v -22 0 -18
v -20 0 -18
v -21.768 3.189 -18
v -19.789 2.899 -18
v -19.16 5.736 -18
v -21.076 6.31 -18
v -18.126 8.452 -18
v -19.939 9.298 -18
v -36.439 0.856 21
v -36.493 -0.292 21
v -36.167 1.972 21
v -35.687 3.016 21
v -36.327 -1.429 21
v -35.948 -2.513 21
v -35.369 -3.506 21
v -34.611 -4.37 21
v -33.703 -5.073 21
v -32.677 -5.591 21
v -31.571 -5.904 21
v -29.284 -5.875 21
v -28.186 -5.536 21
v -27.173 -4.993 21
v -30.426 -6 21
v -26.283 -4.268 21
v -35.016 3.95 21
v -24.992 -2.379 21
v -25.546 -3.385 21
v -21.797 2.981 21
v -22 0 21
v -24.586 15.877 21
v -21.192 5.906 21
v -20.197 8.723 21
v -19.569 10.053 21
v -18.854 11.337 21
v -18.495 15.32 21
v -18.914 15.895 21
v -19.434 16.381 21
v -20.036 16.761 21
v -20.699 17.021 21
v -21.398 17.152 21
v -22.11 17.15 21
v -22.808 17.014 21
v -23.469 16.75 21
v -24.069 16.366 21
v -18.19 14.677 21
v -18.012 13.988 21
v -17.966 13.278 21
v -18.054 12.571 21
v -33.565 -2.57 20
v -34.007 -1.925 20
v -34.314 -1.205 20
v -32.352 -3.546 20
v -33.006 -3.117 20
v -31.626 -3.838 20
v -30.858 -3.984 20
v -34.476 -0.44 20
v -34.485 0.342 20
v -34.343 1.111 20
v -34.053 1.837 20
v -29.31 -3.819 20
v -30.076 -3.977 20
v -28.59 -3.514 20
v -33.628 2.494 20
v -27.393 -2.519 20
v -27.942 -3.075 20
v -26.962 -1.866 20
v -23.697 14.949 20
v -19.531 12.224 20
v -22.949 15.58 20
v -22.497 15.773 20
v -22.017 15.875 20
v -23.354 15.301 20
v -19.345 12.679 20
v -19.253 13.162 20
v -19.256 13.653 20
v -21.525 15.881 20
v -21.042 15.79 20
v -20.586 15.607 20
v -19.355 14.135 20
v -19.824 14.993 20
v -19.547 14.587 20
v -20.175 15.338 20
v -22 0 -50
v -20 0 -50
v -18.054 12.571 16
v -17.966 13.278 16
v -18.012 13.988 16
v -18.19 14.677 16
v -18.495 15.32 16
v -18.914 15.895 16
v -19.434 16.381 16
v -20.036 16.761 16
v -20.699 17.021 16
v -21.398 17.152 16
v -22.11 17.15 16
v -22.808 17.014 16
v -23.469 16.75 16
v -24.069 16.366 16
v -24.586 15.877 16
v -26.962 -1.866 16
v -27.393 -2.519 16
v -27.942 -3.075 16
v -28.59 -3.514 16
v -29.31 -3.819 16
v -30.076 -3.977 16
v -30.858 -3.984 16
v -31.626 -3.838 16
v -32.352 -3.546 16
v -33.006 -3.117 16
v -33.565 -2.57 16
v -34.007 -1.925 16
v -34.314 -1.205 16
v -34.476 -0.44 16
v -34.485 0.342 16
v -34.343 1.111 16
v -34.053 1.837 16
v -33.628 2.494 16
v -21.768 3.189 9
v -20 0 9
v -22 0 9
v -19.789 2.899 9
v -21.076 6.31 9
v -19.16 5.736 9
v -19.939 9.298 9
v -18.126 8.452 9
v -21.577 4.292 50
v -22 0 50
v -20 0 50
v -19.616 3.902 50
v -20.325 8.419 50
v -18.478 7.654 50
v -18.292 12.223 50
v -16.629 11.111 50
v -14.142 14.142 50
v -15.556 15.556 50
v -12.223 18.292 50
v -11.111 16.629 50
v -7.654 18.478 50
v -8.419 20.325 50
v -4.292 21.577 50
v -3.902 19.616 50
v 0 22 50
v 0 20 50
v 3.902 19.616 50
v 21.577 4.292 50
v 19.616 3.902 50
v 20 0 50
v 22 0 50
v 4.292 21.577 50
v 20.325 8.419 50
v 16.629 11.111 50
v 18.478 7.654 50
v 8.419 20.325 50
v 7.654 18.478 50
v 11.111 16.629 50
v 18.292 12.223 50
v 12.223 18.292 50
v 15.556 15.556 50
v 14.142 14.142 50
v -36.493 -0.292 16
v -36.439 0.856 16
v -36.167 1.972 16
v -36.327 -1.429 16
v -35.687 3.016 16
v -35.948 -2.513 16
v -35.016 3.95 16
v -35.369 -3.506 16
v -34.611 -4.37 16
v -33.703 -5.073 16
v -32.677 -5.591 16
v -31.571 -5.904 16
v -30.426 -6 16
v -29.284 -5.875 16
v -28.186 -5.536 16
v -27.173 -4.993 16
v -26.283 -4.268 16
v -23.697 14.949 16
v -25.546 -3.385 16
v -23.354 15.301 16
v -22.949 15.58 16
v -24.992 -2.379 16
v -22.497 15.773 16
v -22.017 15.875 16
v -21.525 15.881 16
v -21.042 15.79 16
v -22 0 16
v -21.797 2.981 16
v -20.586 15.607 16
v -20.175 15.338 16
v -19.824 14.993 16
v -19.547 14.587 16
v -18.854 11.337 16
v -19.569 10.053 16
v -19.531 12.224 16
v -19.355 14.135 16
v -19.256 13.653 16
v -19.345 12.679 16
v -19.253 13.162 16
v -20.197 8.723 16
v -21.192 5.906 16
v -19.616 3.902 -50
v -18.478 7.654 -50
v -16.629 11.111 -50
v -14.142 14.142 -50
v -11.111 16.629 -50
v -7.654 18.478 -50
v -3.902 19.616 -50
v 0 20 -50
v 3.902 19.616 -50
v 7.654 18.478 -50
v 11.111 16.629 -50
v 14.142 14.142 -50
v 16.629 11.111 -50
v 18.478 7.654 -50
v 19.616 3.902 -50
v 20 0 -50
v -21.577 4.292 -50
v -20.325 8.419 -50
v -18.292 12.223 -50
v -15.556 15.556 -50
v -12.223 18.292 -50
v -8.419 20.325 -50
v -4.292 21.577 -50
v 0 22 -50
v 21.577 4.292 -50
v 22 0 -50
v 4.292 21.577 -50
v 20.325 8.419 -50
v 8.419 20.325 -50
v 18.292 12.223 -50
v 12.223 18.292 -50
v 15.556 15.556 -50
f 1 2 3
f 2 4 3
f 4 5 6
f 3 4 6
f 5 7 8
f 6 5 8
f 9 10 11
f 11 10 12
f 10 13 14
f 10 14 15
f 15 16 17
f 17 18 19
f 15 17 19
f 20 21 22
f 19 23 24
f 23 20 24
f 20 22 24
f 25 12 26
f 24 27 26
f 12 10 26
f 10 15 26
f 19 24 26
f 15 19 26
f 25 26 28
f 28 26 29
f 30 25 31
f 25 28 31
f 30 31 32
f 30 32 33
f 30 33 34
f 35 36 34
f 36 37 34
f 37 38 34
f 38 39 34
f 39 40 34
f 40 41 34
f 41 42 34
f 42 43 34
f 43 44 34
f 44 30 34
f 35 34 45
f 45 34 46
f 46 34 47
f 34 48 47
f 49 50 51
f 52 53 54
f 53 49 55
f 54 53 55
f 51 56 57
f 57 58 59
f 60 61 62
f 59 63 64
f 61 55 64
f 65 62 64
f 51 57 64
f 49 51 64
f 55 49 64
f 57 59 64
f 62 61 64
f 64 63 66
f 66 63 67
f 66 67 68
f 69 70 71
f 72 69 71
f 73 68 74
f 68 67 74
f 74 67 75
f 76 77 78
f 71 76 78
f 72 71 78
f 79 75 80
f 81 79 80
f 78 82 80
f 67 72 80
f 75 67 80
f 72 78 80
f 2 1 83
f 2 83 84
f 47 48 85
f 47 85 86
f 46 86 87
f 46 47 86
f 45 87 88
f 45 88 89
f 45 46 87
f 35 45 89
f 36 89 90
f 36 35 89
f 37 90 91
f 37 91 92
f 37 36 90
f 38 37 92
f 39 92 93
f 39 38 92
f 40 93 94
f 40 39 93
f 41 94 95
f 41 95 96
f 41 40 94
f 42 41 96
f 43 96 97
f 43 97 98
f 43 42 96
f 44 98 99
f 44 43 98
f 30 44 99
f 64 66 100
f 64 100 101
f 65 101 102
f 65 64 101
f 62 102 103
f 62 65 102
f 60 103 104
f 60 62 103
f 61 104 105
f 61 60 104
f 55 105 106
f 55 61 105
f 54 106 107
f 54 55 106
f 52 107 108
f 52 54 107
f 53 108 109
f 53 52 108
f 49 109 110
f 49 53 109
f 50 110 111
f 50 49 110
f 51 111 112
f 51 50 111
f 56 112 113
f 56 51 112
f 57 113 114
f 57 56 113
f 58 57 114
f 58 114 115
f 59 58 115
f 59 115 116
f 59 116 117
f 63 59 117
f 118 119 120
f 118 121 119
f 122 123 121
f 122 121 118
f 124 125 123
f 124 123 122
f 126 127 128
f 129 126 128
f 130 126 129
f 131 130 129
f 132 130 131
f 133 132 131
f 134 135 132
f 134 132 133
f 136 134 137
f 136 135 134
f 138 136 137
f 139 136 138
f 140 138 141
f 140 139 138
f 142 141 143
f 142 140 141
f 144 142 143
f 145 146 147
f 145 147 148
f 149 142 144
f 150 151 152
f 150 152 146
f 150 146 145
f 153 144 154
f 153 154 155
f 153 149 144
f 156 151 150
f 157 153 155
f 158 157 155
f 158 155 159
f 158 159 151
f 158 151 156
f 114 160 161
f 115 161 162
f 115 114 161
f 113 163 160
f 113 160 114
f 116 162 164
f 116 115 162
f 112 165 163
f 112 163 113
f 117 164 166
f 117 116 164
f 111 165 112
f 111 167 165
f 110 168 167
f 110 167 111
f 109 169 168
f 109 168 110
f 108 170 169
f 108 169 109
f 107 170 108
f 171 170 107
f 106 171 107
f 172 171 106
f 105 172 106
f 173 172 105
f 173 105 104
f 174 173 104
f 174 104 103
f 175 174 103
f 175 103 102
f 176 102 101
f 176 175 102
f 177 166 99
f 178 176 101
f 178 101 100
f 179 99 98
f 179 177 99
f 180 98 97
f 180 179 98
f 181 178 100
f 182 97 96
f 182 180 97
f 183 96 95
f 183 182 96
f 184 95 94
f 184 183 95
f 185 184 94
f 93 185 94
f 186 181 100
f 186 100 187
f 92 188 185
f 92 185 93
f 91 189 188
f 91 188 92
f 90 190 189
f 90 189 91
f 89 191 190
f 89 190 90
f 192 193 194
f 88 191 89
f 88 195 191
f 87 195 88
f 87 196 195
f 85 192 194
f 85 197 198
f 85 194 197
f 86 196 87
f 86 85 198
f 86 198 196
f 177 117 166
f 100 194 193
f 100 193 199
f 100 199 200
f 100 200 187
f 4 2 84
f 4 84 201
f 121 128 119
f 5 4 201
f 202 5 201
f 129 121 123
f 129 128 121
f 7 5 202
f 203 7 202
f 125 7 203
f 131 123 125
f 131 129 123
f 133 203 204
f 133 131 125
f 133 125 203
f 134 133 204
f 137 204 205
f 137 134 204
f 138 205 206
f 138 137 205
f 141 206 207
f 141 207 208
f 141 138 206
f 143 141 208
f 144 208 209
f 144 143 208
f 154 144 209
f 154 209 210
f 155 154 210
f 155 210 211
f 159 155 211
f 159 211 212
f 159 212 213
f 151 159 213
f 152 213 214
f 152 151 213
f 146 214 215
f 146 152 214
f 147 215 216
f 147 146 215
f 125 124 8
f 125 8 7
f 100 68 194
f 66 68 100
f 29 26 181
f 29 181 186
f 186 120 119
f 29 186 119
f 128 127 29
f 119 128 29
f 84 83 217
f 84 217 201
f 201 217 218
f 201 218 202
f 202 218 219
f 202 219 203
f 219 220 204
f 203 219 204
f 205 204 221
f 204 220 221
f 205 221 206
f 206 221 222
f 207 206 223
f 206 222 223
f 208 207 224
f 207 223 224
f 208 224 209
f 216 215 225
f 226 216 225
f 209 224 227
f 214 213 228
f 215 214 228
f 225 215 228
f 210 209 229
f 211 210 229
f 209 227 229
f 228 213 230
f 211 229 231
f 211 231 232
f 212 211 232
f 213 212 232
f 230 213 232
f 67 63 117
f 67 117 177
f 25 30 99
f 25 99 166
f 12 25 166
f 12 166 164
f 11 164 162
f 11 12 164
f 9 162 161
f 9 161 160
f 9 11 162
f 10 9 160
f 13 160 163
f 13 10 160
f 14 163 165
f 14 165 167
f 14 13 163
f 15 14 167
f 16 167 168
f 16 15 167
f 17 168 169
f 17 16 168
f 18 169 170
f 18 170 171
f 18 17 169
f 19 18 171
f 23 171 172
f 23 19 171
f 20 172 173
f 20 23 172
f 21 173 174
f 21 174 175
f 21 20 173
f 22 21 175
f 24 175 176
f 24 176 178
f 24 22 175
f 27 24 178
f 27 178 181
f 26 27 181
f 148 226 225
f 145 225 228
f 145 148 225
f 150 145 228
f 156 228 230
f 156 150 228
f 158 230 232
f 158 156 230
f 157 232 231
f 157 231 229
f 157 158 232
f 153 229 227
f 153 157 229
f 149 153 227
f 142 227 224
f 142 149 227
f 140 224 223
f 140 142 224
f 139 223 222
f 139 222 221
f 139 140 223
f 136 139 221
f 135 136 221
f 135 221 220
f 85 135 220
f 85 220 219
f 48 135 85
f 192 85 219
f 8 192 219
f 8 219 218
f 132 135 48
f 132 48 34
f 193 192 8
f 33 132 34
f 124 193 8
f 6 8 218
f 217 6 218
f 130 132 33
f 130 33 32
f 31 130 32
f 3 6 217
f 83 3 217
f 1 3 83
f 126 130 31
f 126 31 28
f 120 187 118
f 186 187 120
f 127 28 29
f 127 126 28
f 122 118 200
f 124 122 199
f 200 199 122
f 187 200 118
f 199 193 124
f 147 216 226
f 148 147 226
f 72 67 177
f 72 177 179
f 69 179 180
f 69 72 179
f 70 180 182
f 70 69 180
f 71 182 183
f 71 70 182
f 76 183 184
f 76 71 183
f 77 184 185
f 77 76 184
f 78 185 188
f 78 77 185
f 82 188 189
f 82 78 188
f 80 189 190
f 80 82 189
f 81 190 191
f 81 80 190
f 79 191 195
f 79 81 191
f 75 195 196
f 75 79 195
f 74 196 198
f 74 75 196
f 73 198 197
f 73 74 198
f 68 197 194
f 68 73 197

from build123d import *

# Parameters (mm, degrees)
EXTRUDE_1_DEPTH     = 50
EXTRUDE_3_DEPTH     = 5
EXTRUDE_4_DEPTH     = 1
CUT_EXTRUDE_START   = -27
CUT_EXTRUDE_2_DEPTH = 27
RIB_1_REACH         = 82.675
SKETCH_8_WALL_W     = 167.172938794
SKETCH_8_WALL_H     = 5


with BuildPart() as part:
    # 草图1 → 凸台-拉伸1 (new, symmetric)
    with BuildSketch(Plane.XY):
        with BuildLine():
            Line((-22, 0), (-20, 0))
            ThreePointArc((-20, 0), (0, 20), (20, 0))
            Line((20, 0), (22, 0))
            ThreePointArc((22, 0), (0, 22), (-22, 0))
        make_face()
    extrude(amount=EXTRUDE_1_DEPTH, both=True)

    # 草图2 → 凸台-拉伸3 (add)
    with BuildSketch(Plane.XY.offset(21)):
        with BuildLine():
            Line((-24.585593375, 15.877042923), (-35.01647279, 3.949870066))
            ThreePointArc((-35.01647279, 3.949870066), (-33.703063099, -5.073498476), (-24.991803279, -2.379026877))
            Line((-24.991803279, -2.379026877), (-20.196721311, 8.723098547))
            ThreePointArc((-20.196721311, 8.723098547), (-19.222070856, 10.701027615), (-18.054320126, 12.571456749))
            ThreePointArc((-18.054320126, 12.571456749), (-20.036220369, 16.760693495), (-24.585593375, 15.877042923))
        make_face()
        with BuildLine():
            Line((-33.627552512, 2.493675056), (-23.696783161, 14.948787263))
            ThreePointArc((-23.696783161, 14.948787263), (-20.37363516, 15.482465408), (-19.530762331, 12.223985641))
            Line((-19.530762331, 12.223985641), (-26.961919184, -1.866007539))
            ThreePointArc((-26.961919184, -1.866007539), (-32.68948429, -3.347560088), (-33.627552512, 2.493675056))
        make_face(mode=Mode.SUBTRACT)
    extrude(amount=-EXTRUDE_3_DEPTH)

    # 草图3 → 凸台-拉伸4 (add)
    with BuildSketch(Plane.XY.offset(21)):
        with BuildLine():
            Line((-23.696783161, 14.948787263), (-33.627552512, 2.493675056))
            ThreePointArc((-33.627552512, 2.493675056), (-32.68948429, -3.347560088), (-26.961919184, -1.866007539))
            Line((-26.961919184, -1.866007539), (-19.530762331, 12.223985641))
            ThreePointArc((-19.530762331, 12.223985641), (-20.37363516, 15.482465408), (-23.696783161, 14.948787263))
        make_face()
    extrude(amount=-EXTRUDE_4_DEPTH)

    # 草图6 → 切除-拉伸2 (cut)
    with BuildSketch(Plane(origin=(0, 0, -18), x_dir=(-1, 0, 0), z_dir=(0, 0, -1)).offset(CUT_EXTRUDE_START)):
        with BuildLine():
            Line((20, 0), (22, 0))
            ThreePointArc((22, 0), (21.478512157, 4.761671507), (19.938771315, 9.297601758))
            Line((19.938771315, 9.297601758), (18.126155741, 8.452365235))
            ThreePointArc((18.126155741, 8.452365235), (19.525920142, 4.328792279), (20, 0))
        make_face()
    extrude(amount=CUT_EXTRUDE_2_DEPTH, mode=Mode.SUBTRACT)

    # 草图8 wall → 筋1 (add, up to next)
    with BuildSketch(Plane(origin=(-23.495901639, -1.189513438, 18.5), x_dir=(0.782705129214, 0.622392706177, 0), z_dir=(-0.622392706177, 0.782705129214, 0)), mode=Mode.PRIVATE) as rib_1_sk1:
        Rectangle(SKETCH_8_WALL_W, SKETCH_8_WALL_H)
    rib_1_tool1 = extrude(rib_1_sk1.sketch, amount=RIB_1_REACH, mode=Mode.PRIVATE) - part.part
    add(rib_1_tool1.solids().sort_by_distance((-23.495901639, -1.189513438, 18.5))[0])


solid = part.part
